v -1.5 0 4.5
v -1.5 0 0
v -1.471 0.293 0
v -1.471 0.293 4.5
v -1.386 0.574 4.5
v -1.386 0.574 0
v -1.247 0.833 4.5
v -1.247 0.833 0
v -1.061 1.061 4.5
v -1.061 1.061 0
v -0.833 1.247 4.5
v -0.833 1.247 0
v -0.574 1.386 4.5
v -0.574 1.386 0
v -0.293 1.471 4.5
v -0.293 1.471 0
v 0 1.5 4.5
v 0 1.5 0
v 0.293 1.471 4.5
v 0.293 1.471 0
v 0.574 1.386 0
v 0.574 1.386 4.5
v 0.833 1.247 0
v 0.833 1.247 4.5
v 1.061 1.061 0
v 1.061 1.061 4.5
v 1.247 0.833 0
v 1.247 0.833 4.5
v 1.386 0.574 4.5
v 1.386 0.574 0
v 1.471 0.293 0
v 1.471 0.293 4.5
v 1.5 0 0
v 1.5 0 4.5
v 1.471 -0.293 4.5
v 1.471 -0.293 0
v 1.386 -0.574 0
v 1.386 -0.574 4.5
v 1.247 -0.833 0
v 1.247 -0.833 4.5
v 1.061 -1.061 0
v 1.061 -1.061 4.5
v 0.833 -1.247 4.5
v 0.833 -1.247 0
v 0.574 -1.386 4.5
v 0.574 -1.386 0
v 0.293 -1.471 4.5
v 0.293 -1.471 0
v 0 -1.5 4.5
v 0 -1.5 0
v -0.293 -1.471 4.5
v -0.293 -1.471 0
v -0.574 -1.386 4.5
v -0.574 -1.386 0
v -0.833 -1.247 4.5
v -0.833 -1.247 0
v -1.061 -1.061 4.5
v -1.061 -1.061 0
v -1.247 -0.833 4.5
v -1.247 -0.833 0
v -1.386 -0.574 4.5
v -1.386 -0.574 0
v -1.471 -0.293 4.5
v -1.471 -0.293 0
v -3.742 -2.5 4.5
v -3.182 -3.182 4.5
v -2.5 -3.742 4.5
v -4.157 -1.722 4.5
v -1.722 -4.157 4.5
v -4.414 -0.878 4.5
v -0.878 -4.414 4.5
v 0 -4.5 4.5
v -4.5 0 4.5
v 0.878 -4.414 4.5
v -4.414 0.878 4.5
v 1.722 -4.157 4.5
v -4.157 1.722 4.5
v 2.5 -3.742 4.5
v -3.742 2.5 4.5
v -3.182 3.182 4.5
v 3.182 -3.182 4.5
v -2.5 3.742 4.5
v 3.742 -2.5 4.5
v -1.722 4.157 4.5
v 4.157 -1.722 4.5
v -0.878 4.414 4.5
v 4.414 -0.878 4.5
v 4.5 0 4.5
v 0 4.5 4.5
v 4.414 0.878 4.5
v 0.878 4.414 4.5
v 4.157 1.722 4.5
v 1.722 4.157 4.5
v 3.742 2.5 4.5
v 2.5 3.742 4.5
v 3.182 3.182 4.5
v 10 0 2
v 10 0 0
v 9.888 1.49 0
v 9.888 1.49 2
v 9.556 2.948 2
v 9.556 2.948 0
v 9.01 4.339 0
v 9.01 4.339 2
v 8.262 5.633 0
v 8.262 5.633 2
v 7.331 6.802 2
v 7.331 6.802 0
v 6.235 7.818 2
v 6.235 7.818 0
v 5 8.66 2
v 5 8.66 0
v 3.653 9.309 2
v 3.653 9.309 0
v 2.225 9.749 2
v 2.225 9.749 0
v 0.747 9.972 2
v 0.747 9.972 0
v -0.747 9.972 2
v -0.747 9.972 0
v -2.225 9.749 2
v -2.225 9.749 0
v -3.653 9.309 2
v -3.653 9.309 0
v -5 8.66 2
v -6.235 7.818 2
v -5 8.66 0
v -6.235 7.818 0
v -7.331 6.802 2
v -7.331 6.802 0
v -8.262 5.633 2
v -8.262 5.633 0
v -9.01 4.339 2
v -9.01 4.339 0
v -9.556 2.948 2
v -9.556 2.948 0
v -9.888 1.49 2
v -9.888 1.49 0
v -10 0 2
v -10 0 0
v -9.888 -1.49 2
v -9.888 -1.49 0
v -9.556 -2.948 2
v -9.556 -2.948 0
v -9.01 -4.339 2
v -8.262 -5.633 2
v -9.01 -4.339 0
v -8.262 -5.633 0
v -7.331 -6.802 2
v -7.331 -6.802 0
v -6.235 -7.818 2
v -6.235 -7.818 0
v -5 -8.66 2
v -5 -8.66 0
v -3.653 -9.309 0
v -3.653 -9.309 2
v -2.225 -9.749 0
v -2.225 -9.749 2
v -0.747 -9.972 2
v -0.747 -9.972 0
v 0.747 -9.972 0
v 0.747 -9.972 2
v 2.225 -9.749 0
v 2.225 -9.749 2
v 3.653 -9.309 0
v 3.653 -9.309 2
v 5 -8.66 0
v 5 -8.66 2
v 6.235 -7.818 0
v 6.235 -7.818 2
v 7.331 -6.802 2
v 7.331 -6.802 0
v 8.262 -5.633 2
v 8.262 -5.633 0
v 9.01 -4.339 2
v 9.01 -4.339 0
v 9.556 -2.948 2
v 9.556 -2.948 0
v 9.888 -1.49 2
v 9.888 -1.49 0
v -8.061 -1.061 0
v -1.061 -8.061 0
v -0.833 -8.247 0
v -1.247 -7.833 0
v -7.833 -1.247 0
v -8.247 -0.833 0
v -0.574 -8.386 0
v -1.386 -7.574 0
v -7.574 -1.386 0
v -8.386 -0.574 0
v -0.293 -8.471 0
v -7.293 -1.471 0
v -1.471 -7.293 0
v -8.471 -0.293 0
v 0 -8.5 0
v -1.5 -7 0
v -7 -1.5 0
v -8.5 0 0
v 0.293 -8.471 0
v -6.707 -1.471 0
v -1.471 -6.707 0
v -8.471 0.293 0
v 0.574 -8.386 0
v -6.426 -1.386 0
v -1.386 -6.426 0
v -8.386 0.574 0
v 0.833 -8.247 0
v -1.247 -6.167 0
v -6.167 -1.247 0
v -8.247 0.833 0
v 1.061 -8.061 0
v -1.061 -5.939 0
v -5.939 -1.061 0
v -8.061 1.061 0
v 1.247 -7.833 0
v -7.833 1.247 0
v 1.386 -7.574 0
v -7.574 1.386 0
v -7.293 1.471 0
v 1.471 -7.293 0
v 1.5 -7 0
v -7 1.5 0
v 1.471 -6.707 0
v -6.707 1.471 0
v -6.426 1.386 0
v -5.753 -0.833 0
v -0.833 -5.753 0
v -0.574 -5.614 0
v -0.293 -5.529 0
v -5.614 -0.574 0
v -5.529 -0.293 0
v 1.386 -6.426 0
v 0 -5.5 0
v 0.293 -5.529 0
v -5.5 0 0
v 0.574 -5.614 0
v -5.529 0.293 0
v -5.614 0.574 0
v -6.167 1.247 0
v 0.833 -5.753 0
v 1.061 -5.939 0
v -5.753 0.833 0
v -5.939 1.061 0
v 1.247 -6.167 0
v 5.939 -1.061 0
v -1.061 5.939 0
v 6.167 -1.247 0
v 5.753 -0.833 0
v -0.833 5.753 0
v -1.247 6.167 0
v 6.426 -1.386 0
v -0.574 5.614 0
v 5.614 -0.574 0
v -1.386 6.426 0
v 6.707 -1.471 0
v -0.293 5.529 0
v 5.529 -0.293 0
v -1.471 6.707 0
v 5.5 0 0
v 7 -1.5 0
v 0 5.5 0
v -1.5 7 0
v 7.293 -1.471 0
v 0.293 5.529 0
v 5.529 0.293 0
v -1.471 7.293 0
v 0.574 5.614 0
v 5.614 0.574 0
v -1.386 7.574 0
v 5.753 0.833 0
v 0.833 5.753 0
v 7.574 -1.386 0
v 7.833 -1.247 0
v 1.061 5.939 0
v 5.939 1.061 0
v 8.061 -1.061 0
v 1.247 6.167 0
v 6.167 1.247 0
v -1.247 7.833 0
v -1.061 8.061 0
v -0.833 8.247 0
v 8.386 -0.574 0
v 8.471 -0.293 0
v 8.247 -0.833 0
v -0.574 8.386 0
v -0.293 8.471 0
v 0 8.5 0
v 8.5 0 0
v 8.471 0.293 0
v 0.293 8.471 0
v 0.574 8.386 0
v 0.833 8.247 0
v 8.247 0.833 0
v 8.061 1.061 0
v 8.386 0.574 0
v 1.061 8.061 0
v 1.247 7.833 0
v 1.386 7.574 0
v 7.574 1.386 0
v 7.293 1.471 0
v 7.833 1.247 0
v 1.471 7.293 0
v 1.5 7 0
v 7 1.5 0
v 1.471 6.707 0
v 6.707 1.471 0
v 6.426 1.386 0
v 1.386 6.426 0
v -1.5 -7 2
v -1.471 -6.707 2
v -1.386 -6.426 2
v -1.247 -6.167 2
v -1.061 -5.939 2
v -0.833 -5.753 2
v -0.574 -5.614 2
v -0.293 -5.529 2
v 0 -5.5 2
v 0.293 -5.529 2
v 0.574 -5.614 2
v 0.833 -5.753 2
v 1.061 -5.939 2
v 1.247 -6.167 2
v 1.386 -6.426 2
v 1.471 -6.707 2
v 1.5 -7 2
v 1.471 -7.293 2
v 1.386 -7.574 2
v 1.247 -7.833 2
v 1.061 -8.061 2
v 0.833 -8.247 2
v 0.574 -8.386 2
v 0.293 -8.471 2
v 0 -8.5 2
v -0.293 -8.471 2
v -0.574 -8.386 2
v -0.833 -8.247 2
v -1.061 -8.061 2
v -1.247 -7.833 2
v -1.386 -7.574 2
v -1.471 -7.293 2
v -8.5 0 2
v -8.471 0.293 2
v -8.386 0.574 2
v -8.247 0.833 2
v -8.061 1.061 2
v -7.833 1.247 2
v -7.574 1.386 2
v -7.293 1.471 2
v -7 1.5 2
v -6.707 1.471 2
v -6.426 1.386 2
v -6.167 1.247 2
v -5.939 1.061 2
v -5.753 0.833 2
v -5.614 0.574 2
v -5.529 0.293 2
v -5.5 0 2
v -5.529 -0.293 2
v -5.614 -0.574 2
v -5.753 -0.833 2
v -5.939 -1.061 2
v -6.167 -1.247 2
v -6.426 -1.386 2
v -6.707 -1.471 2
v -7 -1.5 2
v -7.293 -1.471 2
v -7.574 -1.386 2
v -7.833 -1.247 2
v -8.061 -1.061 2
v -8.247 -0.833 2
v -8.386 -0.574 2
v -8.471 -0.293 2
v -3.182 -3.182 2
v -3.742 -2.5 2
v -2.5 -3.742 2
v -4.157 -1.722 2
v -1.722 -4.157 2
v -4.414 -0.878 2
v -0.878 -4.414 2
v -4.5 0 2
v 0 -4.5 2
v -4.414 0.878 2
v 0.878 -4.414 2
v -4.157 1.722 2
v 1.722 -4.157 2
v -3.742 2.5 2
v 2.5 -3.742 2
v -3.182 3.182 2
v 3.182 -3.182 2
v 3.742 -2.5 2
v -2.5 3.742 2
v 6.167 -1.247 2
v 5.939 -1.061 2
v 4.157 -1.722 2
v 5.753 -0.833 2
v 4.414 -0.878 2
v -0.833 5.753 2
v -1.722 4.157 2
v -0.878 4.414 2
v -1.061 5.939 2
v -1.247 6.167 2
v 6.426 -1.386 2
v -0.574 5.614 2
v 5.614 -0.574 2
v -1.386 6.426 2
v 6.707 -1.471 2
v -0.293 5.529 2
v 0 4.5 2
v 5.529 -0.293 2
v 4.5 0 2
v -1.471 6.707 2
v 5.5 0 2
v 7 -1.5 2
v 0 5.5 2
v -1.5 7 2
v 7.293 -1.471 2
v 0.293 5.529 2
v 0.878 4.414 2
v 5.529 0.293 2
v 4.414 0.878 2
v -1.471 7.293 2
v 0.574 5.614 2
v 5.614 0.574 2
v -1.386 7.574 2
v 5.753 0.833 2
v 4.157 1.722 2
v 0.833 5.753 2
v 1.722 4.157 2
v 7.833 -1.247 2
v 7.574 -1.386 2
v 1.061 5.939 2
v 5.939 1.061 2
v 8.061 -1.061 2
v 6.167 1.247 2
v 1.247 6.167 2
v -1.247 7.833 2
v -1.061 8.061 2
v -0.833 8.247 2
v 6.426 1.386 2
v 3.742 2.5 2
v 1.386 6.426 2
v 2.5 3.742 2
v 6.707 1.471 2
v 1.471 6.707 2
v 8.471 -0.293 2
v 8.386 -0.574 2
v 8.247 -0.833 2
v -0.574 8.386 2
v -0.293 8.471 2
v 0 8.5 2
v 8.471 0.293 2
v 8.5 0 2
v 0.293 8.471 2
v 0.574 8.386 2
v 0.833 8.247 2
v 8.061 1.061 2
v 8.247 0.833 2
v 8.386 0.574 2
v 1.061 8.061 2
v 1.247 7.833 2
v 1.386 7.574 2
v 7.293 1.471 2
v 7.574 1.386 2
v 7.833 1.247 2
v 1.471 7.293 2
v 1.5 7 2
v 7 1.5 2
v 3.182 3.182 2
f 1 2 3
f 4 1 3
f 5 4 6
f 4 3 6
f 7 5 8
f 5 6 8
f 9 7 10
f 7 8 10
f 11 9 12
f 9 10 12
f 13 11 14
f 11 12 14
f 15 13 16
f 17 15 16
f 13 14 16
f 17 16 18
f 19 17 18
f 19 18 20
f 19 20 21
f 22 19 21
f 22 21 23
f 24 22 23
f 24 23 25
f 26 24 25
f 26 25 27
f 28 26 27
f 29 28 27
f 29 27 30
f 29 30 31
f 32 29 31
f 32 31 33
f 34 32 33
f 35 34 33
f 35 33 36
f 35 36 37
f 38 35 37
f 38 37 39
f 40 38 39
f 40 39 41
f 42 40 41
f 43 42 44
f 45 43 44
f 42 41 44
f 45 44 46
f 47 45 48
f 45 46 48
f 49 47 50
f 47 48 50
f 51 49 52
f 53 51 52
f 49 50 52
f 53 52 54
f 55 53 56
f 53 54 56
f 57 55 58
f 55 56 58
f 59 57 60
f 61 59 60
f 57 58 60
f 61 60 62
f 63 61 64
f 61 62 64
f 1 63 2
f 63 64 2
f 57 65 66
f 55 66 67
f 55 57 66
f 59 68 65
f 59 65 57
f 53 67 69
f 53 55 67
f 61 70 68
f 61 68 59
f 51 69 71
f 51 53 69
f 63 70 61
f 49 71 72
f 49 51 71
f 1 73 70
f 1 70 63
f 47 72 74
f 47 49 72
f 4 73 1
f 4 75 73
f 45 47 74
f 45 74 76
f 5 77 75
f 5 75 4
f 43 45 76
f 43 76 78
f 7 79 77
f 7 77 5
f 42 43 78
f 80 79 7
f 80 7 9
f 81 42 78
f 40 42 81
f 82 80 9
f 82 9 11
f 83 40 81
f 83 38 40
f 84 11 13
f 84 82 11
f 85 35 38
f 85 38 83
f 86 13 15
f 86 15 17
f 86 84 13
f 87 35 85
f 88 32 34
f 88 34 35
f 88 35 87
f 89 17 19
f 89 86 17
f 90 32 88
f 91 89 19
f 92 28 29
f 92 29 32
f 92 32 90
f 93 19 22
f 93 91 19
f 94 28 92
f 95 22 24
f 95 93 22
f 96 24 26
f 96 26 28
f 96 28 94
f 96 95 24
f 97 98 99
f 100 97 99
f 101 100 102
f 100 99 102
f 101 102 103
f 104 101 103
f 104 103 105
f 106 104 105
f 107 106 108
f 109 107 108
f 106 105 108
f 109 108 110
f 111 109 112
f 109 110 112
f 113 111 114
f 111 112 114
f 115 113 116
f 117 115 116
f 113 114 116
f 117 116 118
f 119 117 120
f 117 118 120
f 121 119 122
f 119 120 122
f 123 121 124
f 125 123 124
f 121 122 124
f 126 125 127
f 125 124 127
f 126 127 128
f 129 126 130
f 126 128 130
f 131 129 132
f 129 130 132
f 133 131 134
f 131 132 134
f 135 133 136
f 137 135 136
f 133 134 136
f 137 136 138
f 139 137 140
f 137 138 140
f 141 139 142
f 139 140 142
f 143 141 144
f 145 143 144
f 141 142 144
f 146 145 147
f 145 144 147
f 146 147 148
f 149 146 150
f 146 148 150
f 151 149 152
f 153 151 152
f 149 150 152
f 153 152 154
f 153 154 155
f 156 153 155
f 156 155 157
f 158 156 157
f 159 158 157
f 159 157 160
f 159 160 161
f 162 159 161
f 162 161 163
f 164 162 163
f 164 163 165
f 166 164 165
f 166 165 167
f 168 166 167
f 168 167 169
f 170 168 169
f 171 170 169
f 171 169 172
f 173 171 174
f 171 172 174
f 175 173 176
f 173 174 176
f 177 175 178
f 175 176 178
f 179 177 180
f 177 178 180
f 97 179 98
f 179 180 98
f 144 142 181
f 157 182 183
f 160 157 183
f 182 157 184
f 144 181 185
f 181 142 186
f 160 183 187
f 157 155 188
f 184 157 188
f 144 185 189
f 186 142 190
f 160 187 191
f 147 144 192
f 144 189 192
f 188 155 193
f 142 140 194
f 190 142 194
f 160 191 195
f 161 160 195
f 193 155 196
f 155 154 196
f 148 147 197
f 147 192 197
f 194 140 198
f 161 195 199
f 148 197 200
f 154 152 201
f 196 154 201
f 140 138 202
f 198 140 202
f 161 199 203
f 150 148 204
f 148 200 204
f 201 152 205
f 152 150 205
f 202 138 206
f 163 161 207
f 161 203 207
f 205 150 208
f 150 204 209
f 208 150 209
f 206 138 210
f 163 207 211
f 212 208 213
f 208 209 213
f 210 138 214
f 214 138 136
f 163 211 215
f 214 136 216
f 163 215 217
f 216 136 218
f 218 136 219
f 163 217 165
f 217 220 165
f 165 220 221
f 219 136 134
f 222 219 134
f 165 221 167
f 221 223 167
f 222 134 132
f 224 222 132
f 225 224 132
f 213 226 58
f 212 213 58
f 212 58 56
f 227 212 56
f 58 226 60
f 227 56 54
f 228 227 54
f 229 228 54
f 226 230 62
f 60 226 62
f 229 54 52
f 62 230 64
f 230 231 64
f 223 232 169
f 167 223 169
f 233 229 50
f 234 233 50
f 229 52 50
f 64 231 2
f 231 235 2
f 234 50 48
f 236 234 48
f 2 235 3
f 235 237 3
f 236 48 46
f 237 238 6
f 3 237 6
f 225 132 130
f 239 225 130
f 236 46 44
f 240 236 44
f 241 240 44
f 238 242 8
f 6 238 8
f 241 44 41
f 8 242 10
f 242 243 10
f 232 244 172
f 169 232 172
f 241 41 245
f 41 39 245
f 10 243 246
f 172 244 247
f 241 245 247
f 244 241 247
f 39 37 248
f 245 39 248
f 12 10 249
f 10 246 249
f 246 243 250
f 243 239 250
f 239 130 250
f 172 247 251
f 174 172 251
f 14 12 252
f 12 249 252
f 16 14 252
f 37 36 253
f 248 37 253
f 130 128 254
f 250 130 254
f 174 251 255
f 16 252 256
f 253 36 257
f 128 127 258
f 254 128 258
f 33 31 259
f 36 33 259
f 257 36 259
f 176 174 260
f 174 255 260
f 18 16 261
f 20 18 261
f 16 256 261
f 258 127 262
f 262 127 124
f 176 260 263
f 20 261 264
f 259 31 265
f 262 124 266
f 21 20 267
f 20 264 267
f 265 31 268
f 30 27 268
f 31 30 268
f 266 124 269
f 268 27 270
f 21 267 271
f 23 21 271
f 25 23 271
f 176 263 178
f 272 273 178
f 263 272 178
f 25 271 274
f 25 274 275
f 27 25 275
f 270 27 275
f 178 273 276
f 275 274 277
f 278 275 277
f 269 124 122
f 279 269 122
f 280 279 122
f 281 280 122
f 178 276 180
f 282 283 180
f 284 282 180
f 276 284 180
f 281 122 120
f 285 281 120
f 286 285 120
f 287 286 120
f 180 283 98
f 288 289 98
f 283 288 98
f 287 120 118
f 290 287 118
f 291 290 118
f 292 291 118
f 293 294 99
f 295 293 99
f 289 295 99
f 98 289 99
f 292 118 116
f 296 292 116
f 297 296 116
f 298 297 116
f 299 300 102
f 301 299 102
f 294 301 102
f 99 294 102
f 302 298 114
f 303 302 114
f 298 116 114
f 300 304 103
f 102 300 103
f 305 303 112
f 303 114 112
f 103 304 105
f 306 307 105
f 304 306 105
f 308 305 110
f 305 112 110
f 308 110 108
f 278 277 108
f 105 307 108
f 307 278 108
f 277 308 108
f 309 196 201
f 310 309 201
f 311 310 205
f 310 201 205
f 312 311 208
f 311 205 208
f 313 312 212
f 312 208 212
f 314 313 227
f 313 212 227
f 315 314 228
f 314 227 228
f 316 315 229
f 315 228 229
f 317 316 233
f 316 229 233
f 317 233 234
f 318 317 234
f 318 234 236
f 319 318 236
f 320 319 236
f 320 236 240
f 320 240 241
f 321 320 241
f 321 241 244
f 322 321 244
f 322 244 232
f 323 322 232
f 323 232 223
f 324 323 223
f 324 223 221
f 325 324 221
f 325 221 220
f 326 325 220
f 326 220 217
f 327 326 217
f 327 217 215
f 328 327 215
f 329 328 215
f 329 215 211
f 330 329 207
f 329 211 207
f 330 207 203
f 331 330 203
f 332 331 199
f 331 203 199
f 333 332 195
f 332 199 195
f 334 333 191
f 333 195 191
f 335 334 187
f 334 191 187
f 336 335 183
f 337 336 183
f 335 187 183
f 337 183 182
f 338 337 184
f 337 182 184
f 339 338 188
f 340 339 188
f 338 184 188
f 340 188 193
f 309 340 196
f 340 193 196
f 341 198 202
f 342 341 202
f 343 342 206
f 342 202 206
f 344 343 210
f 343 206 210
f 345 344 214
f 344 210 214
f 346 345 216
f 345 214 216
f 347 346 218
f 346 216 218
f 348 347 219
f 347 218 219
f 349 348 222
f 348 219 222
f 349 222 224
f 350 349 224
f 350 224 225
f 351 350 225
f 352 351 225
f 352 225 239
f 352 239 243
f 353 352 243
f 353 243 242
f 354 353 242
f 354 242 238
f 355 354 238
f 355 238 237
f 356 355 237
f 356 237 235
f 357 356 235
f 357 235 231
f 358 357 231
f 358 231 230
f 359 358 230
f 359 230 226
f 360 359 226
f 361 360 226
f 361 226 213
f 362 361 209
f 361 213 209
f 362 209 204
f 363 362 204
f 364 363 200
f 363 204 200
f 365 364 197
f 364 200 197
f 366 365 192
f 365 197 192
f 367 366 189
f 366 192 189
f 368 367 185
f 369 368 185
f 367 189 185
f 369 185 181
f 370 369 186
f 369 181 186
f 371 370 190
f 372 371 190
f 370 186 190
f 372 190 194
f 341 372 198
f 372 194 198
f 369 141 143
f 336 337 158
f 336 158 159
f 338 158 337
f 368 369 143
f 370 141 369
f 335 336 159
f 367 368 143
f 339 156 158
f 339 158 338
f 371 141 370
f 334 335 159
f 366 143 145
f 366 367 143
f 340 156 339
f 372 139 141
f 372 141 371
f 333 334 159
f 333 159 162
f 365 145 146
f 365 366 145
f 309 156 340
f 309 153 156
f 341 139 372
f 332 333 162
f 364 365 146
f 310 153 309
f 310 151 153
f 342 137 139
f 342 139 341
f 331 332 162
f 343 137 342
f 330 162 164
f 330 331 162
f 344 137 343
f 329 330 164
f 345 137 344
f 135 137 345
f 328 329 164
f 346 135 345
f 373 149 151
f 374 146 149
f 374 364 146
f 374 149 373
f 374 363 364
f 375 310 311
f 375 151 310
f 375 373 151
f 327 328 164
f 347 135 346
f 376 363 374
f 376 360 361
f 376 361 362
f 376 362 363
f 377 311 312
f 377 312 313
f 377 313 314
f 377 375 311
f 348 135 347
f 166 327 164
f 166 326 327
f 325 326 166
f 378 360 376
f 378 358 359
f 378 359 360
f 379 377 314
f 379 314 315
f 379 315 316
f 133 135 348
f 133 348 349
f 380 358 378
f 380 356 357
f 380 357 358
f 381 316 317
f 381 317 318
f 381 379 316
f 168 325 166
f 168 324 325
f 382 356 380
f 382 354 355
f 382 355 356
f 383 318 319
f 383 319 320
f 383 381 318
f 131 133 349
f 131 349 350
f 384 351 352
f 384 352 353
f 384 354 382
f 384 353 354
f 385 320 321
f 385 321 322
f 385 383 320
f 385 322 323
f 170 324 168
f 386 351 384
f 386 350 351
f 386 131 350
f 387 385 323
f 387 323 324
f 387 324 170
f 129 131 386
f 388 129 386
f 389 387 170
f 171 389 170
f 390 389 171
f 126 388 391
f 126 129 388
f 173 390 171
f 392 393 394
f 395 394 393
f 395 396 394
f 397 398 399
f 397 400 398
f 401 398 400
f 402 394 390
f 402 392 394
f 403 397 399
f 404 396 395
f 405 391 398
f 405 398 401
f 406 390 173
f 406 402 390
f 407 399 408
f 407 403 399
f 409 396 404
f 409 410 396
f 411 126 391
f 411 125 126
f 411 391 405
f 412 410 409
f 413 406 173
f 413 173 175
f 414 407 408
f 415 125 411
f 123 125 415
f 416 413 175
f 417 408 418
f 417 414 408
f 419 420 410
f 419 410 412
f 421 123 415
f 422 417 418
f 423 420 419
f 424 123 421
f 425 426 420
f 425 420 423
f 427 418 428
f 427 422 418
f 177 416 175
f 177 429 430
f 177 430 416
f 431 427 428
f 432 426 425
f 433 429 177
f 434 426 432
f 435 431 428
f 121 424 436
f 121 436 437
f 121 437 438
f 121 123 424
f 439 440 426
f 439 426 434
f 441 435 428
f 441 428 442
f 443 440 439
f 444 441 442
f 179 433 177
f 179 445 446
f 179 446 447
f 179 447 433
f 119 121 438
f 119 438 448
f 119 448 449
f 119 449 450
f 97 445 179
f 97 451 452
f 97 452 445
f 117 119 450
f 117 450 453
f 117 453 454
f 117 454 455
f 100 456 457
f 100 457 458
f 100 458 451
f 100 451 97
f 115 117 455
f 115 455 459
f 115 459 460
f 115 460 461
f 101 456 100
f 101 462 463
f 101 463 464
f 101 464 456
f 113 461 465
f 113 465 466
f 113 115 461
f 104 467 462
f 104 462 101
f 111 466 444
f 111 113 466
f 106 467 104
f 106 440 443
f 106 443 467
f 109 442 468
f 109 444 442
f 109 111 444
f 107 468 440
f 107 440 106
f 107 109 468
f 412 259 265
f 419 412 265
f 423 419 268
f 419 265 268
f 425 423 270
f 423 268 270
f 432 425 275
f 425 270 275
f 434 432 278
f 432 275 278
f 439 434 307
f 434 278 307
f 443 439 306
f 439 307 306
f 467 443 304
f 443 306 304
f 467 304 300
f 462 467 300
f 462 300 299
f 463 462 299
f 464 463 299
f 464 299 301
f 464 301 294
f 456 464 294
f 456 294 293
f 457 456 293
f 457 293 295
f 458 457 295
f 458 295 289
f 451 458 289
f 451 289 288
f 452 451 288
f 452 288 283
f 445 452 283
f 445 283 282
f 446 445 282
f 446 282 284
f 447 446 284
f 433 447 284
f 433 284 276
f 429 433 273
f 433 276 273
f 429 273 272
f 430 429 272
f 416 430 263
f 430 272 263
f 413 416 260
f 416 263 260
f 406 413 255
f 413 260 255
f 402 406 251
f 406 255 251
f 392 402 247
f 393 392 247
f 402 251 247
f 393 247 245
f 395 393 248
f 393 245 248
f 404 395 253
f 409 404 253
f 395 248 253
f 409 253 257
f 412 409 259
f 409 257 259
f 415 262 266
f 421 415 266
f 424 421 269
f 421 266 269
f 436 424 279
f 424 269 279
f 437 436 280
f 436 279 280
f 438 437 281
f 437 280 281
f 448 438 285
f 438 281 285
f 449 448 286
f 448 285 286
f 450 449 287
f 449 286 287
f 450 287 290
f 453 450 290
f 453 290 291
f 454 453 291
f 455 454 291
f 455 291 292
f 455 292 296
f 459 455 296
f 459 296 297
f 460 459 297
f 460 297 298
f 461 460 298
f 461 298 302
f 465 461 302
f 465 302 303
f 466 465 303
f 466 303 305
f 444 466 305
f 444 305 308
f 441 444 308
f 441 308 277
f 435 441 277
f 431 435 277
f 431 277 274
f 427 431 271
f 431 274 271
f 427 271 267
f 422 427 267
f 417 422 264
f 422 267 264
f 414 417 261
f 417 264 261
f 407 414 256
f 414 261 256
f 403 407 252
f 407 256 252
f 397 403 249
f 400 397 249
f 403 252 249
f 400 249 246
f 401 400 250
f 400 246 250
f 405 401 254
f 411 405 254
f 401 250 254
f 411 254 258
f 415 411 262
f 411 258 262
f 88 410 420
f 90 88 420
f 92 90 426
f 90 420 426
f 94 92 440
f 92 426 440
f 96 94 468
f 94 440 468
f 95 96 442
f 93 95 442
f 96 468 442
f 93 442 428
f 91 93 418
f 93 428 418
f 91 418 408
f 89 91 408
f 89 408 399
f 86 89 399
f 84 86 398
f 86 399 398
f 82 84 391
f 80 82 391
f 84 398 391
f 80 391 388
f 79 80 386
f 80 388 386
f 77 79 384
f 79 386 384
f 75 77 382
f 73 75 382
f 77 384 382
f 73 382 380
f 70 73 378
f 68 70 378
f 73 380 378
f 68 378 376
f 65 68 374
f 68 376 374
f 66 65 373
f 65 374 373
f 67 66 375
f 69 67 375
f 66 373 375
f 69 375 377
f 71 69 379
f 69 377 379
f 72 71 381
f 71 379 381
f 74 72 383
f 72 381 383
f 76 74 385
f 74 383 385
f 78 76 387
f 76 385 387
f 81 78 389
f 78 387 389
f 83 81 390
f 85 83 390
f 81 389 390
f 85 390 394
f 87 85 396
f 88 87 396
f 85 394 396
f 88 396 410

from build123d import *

# Parameters (mm, degrees)
SKETCH_1_R          = 10
EXTRUDE_1_DEPTH     = 2
SKETCH_2_R          = 4.5
EXTRUDE_2_DEPTH     = 2.5
SKETCH_3_R          = 1.5
CUT_EXTRUDE_1_DEPTH = 2.5
SKETCH_4_R          = 1.5
CUT_EXTRUDE_2_DEPTH = 15.84082208


with BuildPart() as part:
    # 草图1 → 凸台-拉伸1 (new body)
    with BuildSketch(Plane.XY):
        Circle(SKETCH_1_R)
    extrude(amount=EXTRUDE_1_DEPTH)

    # 草图2 → 凸台-拉伸2 (add)
    with BuildSketch(Plane.XY.offset(2)):
        Circle(SKETCH_2_R)
    extrude(amount=EXTRUDE_2_DEPTH)

    # 草图3 → 切除-拉伸1 (cut)
    with BuildSketch(Plane(origin=(0, 0, 0), x_dir=(-1, 0, 0), z_dir=(0, 0, -1))):
        with Locations((0, 7)):
            Circle(SKETCH_3_R)
        with Locations((7, 0)):
            Circle(SKETCH_3_R)
        with Locations((0, -7)):
            Circle(SKETCH_3_R)
        with Locations((-7, 0)):
            Circle(SKETCH_3_R)
    extrude(amount=-CUT_EXTRUDE_1_DEPTH, mode=Mode.SUBTRACT)

    # 草图4 → 切除-拉伸2 (cut, through all)
    with BuildSketch(Plane(origin=(0, 0, 0), x_dir=(-1, 0, 0), z_dir=(0, 0, -1))):
        Circle(SKETCH_4_R)
    extrude(amount=-CUT_EXTRUDE_2_DEPTH, mode=Mode.SUBTRACT)


solid = part.part
